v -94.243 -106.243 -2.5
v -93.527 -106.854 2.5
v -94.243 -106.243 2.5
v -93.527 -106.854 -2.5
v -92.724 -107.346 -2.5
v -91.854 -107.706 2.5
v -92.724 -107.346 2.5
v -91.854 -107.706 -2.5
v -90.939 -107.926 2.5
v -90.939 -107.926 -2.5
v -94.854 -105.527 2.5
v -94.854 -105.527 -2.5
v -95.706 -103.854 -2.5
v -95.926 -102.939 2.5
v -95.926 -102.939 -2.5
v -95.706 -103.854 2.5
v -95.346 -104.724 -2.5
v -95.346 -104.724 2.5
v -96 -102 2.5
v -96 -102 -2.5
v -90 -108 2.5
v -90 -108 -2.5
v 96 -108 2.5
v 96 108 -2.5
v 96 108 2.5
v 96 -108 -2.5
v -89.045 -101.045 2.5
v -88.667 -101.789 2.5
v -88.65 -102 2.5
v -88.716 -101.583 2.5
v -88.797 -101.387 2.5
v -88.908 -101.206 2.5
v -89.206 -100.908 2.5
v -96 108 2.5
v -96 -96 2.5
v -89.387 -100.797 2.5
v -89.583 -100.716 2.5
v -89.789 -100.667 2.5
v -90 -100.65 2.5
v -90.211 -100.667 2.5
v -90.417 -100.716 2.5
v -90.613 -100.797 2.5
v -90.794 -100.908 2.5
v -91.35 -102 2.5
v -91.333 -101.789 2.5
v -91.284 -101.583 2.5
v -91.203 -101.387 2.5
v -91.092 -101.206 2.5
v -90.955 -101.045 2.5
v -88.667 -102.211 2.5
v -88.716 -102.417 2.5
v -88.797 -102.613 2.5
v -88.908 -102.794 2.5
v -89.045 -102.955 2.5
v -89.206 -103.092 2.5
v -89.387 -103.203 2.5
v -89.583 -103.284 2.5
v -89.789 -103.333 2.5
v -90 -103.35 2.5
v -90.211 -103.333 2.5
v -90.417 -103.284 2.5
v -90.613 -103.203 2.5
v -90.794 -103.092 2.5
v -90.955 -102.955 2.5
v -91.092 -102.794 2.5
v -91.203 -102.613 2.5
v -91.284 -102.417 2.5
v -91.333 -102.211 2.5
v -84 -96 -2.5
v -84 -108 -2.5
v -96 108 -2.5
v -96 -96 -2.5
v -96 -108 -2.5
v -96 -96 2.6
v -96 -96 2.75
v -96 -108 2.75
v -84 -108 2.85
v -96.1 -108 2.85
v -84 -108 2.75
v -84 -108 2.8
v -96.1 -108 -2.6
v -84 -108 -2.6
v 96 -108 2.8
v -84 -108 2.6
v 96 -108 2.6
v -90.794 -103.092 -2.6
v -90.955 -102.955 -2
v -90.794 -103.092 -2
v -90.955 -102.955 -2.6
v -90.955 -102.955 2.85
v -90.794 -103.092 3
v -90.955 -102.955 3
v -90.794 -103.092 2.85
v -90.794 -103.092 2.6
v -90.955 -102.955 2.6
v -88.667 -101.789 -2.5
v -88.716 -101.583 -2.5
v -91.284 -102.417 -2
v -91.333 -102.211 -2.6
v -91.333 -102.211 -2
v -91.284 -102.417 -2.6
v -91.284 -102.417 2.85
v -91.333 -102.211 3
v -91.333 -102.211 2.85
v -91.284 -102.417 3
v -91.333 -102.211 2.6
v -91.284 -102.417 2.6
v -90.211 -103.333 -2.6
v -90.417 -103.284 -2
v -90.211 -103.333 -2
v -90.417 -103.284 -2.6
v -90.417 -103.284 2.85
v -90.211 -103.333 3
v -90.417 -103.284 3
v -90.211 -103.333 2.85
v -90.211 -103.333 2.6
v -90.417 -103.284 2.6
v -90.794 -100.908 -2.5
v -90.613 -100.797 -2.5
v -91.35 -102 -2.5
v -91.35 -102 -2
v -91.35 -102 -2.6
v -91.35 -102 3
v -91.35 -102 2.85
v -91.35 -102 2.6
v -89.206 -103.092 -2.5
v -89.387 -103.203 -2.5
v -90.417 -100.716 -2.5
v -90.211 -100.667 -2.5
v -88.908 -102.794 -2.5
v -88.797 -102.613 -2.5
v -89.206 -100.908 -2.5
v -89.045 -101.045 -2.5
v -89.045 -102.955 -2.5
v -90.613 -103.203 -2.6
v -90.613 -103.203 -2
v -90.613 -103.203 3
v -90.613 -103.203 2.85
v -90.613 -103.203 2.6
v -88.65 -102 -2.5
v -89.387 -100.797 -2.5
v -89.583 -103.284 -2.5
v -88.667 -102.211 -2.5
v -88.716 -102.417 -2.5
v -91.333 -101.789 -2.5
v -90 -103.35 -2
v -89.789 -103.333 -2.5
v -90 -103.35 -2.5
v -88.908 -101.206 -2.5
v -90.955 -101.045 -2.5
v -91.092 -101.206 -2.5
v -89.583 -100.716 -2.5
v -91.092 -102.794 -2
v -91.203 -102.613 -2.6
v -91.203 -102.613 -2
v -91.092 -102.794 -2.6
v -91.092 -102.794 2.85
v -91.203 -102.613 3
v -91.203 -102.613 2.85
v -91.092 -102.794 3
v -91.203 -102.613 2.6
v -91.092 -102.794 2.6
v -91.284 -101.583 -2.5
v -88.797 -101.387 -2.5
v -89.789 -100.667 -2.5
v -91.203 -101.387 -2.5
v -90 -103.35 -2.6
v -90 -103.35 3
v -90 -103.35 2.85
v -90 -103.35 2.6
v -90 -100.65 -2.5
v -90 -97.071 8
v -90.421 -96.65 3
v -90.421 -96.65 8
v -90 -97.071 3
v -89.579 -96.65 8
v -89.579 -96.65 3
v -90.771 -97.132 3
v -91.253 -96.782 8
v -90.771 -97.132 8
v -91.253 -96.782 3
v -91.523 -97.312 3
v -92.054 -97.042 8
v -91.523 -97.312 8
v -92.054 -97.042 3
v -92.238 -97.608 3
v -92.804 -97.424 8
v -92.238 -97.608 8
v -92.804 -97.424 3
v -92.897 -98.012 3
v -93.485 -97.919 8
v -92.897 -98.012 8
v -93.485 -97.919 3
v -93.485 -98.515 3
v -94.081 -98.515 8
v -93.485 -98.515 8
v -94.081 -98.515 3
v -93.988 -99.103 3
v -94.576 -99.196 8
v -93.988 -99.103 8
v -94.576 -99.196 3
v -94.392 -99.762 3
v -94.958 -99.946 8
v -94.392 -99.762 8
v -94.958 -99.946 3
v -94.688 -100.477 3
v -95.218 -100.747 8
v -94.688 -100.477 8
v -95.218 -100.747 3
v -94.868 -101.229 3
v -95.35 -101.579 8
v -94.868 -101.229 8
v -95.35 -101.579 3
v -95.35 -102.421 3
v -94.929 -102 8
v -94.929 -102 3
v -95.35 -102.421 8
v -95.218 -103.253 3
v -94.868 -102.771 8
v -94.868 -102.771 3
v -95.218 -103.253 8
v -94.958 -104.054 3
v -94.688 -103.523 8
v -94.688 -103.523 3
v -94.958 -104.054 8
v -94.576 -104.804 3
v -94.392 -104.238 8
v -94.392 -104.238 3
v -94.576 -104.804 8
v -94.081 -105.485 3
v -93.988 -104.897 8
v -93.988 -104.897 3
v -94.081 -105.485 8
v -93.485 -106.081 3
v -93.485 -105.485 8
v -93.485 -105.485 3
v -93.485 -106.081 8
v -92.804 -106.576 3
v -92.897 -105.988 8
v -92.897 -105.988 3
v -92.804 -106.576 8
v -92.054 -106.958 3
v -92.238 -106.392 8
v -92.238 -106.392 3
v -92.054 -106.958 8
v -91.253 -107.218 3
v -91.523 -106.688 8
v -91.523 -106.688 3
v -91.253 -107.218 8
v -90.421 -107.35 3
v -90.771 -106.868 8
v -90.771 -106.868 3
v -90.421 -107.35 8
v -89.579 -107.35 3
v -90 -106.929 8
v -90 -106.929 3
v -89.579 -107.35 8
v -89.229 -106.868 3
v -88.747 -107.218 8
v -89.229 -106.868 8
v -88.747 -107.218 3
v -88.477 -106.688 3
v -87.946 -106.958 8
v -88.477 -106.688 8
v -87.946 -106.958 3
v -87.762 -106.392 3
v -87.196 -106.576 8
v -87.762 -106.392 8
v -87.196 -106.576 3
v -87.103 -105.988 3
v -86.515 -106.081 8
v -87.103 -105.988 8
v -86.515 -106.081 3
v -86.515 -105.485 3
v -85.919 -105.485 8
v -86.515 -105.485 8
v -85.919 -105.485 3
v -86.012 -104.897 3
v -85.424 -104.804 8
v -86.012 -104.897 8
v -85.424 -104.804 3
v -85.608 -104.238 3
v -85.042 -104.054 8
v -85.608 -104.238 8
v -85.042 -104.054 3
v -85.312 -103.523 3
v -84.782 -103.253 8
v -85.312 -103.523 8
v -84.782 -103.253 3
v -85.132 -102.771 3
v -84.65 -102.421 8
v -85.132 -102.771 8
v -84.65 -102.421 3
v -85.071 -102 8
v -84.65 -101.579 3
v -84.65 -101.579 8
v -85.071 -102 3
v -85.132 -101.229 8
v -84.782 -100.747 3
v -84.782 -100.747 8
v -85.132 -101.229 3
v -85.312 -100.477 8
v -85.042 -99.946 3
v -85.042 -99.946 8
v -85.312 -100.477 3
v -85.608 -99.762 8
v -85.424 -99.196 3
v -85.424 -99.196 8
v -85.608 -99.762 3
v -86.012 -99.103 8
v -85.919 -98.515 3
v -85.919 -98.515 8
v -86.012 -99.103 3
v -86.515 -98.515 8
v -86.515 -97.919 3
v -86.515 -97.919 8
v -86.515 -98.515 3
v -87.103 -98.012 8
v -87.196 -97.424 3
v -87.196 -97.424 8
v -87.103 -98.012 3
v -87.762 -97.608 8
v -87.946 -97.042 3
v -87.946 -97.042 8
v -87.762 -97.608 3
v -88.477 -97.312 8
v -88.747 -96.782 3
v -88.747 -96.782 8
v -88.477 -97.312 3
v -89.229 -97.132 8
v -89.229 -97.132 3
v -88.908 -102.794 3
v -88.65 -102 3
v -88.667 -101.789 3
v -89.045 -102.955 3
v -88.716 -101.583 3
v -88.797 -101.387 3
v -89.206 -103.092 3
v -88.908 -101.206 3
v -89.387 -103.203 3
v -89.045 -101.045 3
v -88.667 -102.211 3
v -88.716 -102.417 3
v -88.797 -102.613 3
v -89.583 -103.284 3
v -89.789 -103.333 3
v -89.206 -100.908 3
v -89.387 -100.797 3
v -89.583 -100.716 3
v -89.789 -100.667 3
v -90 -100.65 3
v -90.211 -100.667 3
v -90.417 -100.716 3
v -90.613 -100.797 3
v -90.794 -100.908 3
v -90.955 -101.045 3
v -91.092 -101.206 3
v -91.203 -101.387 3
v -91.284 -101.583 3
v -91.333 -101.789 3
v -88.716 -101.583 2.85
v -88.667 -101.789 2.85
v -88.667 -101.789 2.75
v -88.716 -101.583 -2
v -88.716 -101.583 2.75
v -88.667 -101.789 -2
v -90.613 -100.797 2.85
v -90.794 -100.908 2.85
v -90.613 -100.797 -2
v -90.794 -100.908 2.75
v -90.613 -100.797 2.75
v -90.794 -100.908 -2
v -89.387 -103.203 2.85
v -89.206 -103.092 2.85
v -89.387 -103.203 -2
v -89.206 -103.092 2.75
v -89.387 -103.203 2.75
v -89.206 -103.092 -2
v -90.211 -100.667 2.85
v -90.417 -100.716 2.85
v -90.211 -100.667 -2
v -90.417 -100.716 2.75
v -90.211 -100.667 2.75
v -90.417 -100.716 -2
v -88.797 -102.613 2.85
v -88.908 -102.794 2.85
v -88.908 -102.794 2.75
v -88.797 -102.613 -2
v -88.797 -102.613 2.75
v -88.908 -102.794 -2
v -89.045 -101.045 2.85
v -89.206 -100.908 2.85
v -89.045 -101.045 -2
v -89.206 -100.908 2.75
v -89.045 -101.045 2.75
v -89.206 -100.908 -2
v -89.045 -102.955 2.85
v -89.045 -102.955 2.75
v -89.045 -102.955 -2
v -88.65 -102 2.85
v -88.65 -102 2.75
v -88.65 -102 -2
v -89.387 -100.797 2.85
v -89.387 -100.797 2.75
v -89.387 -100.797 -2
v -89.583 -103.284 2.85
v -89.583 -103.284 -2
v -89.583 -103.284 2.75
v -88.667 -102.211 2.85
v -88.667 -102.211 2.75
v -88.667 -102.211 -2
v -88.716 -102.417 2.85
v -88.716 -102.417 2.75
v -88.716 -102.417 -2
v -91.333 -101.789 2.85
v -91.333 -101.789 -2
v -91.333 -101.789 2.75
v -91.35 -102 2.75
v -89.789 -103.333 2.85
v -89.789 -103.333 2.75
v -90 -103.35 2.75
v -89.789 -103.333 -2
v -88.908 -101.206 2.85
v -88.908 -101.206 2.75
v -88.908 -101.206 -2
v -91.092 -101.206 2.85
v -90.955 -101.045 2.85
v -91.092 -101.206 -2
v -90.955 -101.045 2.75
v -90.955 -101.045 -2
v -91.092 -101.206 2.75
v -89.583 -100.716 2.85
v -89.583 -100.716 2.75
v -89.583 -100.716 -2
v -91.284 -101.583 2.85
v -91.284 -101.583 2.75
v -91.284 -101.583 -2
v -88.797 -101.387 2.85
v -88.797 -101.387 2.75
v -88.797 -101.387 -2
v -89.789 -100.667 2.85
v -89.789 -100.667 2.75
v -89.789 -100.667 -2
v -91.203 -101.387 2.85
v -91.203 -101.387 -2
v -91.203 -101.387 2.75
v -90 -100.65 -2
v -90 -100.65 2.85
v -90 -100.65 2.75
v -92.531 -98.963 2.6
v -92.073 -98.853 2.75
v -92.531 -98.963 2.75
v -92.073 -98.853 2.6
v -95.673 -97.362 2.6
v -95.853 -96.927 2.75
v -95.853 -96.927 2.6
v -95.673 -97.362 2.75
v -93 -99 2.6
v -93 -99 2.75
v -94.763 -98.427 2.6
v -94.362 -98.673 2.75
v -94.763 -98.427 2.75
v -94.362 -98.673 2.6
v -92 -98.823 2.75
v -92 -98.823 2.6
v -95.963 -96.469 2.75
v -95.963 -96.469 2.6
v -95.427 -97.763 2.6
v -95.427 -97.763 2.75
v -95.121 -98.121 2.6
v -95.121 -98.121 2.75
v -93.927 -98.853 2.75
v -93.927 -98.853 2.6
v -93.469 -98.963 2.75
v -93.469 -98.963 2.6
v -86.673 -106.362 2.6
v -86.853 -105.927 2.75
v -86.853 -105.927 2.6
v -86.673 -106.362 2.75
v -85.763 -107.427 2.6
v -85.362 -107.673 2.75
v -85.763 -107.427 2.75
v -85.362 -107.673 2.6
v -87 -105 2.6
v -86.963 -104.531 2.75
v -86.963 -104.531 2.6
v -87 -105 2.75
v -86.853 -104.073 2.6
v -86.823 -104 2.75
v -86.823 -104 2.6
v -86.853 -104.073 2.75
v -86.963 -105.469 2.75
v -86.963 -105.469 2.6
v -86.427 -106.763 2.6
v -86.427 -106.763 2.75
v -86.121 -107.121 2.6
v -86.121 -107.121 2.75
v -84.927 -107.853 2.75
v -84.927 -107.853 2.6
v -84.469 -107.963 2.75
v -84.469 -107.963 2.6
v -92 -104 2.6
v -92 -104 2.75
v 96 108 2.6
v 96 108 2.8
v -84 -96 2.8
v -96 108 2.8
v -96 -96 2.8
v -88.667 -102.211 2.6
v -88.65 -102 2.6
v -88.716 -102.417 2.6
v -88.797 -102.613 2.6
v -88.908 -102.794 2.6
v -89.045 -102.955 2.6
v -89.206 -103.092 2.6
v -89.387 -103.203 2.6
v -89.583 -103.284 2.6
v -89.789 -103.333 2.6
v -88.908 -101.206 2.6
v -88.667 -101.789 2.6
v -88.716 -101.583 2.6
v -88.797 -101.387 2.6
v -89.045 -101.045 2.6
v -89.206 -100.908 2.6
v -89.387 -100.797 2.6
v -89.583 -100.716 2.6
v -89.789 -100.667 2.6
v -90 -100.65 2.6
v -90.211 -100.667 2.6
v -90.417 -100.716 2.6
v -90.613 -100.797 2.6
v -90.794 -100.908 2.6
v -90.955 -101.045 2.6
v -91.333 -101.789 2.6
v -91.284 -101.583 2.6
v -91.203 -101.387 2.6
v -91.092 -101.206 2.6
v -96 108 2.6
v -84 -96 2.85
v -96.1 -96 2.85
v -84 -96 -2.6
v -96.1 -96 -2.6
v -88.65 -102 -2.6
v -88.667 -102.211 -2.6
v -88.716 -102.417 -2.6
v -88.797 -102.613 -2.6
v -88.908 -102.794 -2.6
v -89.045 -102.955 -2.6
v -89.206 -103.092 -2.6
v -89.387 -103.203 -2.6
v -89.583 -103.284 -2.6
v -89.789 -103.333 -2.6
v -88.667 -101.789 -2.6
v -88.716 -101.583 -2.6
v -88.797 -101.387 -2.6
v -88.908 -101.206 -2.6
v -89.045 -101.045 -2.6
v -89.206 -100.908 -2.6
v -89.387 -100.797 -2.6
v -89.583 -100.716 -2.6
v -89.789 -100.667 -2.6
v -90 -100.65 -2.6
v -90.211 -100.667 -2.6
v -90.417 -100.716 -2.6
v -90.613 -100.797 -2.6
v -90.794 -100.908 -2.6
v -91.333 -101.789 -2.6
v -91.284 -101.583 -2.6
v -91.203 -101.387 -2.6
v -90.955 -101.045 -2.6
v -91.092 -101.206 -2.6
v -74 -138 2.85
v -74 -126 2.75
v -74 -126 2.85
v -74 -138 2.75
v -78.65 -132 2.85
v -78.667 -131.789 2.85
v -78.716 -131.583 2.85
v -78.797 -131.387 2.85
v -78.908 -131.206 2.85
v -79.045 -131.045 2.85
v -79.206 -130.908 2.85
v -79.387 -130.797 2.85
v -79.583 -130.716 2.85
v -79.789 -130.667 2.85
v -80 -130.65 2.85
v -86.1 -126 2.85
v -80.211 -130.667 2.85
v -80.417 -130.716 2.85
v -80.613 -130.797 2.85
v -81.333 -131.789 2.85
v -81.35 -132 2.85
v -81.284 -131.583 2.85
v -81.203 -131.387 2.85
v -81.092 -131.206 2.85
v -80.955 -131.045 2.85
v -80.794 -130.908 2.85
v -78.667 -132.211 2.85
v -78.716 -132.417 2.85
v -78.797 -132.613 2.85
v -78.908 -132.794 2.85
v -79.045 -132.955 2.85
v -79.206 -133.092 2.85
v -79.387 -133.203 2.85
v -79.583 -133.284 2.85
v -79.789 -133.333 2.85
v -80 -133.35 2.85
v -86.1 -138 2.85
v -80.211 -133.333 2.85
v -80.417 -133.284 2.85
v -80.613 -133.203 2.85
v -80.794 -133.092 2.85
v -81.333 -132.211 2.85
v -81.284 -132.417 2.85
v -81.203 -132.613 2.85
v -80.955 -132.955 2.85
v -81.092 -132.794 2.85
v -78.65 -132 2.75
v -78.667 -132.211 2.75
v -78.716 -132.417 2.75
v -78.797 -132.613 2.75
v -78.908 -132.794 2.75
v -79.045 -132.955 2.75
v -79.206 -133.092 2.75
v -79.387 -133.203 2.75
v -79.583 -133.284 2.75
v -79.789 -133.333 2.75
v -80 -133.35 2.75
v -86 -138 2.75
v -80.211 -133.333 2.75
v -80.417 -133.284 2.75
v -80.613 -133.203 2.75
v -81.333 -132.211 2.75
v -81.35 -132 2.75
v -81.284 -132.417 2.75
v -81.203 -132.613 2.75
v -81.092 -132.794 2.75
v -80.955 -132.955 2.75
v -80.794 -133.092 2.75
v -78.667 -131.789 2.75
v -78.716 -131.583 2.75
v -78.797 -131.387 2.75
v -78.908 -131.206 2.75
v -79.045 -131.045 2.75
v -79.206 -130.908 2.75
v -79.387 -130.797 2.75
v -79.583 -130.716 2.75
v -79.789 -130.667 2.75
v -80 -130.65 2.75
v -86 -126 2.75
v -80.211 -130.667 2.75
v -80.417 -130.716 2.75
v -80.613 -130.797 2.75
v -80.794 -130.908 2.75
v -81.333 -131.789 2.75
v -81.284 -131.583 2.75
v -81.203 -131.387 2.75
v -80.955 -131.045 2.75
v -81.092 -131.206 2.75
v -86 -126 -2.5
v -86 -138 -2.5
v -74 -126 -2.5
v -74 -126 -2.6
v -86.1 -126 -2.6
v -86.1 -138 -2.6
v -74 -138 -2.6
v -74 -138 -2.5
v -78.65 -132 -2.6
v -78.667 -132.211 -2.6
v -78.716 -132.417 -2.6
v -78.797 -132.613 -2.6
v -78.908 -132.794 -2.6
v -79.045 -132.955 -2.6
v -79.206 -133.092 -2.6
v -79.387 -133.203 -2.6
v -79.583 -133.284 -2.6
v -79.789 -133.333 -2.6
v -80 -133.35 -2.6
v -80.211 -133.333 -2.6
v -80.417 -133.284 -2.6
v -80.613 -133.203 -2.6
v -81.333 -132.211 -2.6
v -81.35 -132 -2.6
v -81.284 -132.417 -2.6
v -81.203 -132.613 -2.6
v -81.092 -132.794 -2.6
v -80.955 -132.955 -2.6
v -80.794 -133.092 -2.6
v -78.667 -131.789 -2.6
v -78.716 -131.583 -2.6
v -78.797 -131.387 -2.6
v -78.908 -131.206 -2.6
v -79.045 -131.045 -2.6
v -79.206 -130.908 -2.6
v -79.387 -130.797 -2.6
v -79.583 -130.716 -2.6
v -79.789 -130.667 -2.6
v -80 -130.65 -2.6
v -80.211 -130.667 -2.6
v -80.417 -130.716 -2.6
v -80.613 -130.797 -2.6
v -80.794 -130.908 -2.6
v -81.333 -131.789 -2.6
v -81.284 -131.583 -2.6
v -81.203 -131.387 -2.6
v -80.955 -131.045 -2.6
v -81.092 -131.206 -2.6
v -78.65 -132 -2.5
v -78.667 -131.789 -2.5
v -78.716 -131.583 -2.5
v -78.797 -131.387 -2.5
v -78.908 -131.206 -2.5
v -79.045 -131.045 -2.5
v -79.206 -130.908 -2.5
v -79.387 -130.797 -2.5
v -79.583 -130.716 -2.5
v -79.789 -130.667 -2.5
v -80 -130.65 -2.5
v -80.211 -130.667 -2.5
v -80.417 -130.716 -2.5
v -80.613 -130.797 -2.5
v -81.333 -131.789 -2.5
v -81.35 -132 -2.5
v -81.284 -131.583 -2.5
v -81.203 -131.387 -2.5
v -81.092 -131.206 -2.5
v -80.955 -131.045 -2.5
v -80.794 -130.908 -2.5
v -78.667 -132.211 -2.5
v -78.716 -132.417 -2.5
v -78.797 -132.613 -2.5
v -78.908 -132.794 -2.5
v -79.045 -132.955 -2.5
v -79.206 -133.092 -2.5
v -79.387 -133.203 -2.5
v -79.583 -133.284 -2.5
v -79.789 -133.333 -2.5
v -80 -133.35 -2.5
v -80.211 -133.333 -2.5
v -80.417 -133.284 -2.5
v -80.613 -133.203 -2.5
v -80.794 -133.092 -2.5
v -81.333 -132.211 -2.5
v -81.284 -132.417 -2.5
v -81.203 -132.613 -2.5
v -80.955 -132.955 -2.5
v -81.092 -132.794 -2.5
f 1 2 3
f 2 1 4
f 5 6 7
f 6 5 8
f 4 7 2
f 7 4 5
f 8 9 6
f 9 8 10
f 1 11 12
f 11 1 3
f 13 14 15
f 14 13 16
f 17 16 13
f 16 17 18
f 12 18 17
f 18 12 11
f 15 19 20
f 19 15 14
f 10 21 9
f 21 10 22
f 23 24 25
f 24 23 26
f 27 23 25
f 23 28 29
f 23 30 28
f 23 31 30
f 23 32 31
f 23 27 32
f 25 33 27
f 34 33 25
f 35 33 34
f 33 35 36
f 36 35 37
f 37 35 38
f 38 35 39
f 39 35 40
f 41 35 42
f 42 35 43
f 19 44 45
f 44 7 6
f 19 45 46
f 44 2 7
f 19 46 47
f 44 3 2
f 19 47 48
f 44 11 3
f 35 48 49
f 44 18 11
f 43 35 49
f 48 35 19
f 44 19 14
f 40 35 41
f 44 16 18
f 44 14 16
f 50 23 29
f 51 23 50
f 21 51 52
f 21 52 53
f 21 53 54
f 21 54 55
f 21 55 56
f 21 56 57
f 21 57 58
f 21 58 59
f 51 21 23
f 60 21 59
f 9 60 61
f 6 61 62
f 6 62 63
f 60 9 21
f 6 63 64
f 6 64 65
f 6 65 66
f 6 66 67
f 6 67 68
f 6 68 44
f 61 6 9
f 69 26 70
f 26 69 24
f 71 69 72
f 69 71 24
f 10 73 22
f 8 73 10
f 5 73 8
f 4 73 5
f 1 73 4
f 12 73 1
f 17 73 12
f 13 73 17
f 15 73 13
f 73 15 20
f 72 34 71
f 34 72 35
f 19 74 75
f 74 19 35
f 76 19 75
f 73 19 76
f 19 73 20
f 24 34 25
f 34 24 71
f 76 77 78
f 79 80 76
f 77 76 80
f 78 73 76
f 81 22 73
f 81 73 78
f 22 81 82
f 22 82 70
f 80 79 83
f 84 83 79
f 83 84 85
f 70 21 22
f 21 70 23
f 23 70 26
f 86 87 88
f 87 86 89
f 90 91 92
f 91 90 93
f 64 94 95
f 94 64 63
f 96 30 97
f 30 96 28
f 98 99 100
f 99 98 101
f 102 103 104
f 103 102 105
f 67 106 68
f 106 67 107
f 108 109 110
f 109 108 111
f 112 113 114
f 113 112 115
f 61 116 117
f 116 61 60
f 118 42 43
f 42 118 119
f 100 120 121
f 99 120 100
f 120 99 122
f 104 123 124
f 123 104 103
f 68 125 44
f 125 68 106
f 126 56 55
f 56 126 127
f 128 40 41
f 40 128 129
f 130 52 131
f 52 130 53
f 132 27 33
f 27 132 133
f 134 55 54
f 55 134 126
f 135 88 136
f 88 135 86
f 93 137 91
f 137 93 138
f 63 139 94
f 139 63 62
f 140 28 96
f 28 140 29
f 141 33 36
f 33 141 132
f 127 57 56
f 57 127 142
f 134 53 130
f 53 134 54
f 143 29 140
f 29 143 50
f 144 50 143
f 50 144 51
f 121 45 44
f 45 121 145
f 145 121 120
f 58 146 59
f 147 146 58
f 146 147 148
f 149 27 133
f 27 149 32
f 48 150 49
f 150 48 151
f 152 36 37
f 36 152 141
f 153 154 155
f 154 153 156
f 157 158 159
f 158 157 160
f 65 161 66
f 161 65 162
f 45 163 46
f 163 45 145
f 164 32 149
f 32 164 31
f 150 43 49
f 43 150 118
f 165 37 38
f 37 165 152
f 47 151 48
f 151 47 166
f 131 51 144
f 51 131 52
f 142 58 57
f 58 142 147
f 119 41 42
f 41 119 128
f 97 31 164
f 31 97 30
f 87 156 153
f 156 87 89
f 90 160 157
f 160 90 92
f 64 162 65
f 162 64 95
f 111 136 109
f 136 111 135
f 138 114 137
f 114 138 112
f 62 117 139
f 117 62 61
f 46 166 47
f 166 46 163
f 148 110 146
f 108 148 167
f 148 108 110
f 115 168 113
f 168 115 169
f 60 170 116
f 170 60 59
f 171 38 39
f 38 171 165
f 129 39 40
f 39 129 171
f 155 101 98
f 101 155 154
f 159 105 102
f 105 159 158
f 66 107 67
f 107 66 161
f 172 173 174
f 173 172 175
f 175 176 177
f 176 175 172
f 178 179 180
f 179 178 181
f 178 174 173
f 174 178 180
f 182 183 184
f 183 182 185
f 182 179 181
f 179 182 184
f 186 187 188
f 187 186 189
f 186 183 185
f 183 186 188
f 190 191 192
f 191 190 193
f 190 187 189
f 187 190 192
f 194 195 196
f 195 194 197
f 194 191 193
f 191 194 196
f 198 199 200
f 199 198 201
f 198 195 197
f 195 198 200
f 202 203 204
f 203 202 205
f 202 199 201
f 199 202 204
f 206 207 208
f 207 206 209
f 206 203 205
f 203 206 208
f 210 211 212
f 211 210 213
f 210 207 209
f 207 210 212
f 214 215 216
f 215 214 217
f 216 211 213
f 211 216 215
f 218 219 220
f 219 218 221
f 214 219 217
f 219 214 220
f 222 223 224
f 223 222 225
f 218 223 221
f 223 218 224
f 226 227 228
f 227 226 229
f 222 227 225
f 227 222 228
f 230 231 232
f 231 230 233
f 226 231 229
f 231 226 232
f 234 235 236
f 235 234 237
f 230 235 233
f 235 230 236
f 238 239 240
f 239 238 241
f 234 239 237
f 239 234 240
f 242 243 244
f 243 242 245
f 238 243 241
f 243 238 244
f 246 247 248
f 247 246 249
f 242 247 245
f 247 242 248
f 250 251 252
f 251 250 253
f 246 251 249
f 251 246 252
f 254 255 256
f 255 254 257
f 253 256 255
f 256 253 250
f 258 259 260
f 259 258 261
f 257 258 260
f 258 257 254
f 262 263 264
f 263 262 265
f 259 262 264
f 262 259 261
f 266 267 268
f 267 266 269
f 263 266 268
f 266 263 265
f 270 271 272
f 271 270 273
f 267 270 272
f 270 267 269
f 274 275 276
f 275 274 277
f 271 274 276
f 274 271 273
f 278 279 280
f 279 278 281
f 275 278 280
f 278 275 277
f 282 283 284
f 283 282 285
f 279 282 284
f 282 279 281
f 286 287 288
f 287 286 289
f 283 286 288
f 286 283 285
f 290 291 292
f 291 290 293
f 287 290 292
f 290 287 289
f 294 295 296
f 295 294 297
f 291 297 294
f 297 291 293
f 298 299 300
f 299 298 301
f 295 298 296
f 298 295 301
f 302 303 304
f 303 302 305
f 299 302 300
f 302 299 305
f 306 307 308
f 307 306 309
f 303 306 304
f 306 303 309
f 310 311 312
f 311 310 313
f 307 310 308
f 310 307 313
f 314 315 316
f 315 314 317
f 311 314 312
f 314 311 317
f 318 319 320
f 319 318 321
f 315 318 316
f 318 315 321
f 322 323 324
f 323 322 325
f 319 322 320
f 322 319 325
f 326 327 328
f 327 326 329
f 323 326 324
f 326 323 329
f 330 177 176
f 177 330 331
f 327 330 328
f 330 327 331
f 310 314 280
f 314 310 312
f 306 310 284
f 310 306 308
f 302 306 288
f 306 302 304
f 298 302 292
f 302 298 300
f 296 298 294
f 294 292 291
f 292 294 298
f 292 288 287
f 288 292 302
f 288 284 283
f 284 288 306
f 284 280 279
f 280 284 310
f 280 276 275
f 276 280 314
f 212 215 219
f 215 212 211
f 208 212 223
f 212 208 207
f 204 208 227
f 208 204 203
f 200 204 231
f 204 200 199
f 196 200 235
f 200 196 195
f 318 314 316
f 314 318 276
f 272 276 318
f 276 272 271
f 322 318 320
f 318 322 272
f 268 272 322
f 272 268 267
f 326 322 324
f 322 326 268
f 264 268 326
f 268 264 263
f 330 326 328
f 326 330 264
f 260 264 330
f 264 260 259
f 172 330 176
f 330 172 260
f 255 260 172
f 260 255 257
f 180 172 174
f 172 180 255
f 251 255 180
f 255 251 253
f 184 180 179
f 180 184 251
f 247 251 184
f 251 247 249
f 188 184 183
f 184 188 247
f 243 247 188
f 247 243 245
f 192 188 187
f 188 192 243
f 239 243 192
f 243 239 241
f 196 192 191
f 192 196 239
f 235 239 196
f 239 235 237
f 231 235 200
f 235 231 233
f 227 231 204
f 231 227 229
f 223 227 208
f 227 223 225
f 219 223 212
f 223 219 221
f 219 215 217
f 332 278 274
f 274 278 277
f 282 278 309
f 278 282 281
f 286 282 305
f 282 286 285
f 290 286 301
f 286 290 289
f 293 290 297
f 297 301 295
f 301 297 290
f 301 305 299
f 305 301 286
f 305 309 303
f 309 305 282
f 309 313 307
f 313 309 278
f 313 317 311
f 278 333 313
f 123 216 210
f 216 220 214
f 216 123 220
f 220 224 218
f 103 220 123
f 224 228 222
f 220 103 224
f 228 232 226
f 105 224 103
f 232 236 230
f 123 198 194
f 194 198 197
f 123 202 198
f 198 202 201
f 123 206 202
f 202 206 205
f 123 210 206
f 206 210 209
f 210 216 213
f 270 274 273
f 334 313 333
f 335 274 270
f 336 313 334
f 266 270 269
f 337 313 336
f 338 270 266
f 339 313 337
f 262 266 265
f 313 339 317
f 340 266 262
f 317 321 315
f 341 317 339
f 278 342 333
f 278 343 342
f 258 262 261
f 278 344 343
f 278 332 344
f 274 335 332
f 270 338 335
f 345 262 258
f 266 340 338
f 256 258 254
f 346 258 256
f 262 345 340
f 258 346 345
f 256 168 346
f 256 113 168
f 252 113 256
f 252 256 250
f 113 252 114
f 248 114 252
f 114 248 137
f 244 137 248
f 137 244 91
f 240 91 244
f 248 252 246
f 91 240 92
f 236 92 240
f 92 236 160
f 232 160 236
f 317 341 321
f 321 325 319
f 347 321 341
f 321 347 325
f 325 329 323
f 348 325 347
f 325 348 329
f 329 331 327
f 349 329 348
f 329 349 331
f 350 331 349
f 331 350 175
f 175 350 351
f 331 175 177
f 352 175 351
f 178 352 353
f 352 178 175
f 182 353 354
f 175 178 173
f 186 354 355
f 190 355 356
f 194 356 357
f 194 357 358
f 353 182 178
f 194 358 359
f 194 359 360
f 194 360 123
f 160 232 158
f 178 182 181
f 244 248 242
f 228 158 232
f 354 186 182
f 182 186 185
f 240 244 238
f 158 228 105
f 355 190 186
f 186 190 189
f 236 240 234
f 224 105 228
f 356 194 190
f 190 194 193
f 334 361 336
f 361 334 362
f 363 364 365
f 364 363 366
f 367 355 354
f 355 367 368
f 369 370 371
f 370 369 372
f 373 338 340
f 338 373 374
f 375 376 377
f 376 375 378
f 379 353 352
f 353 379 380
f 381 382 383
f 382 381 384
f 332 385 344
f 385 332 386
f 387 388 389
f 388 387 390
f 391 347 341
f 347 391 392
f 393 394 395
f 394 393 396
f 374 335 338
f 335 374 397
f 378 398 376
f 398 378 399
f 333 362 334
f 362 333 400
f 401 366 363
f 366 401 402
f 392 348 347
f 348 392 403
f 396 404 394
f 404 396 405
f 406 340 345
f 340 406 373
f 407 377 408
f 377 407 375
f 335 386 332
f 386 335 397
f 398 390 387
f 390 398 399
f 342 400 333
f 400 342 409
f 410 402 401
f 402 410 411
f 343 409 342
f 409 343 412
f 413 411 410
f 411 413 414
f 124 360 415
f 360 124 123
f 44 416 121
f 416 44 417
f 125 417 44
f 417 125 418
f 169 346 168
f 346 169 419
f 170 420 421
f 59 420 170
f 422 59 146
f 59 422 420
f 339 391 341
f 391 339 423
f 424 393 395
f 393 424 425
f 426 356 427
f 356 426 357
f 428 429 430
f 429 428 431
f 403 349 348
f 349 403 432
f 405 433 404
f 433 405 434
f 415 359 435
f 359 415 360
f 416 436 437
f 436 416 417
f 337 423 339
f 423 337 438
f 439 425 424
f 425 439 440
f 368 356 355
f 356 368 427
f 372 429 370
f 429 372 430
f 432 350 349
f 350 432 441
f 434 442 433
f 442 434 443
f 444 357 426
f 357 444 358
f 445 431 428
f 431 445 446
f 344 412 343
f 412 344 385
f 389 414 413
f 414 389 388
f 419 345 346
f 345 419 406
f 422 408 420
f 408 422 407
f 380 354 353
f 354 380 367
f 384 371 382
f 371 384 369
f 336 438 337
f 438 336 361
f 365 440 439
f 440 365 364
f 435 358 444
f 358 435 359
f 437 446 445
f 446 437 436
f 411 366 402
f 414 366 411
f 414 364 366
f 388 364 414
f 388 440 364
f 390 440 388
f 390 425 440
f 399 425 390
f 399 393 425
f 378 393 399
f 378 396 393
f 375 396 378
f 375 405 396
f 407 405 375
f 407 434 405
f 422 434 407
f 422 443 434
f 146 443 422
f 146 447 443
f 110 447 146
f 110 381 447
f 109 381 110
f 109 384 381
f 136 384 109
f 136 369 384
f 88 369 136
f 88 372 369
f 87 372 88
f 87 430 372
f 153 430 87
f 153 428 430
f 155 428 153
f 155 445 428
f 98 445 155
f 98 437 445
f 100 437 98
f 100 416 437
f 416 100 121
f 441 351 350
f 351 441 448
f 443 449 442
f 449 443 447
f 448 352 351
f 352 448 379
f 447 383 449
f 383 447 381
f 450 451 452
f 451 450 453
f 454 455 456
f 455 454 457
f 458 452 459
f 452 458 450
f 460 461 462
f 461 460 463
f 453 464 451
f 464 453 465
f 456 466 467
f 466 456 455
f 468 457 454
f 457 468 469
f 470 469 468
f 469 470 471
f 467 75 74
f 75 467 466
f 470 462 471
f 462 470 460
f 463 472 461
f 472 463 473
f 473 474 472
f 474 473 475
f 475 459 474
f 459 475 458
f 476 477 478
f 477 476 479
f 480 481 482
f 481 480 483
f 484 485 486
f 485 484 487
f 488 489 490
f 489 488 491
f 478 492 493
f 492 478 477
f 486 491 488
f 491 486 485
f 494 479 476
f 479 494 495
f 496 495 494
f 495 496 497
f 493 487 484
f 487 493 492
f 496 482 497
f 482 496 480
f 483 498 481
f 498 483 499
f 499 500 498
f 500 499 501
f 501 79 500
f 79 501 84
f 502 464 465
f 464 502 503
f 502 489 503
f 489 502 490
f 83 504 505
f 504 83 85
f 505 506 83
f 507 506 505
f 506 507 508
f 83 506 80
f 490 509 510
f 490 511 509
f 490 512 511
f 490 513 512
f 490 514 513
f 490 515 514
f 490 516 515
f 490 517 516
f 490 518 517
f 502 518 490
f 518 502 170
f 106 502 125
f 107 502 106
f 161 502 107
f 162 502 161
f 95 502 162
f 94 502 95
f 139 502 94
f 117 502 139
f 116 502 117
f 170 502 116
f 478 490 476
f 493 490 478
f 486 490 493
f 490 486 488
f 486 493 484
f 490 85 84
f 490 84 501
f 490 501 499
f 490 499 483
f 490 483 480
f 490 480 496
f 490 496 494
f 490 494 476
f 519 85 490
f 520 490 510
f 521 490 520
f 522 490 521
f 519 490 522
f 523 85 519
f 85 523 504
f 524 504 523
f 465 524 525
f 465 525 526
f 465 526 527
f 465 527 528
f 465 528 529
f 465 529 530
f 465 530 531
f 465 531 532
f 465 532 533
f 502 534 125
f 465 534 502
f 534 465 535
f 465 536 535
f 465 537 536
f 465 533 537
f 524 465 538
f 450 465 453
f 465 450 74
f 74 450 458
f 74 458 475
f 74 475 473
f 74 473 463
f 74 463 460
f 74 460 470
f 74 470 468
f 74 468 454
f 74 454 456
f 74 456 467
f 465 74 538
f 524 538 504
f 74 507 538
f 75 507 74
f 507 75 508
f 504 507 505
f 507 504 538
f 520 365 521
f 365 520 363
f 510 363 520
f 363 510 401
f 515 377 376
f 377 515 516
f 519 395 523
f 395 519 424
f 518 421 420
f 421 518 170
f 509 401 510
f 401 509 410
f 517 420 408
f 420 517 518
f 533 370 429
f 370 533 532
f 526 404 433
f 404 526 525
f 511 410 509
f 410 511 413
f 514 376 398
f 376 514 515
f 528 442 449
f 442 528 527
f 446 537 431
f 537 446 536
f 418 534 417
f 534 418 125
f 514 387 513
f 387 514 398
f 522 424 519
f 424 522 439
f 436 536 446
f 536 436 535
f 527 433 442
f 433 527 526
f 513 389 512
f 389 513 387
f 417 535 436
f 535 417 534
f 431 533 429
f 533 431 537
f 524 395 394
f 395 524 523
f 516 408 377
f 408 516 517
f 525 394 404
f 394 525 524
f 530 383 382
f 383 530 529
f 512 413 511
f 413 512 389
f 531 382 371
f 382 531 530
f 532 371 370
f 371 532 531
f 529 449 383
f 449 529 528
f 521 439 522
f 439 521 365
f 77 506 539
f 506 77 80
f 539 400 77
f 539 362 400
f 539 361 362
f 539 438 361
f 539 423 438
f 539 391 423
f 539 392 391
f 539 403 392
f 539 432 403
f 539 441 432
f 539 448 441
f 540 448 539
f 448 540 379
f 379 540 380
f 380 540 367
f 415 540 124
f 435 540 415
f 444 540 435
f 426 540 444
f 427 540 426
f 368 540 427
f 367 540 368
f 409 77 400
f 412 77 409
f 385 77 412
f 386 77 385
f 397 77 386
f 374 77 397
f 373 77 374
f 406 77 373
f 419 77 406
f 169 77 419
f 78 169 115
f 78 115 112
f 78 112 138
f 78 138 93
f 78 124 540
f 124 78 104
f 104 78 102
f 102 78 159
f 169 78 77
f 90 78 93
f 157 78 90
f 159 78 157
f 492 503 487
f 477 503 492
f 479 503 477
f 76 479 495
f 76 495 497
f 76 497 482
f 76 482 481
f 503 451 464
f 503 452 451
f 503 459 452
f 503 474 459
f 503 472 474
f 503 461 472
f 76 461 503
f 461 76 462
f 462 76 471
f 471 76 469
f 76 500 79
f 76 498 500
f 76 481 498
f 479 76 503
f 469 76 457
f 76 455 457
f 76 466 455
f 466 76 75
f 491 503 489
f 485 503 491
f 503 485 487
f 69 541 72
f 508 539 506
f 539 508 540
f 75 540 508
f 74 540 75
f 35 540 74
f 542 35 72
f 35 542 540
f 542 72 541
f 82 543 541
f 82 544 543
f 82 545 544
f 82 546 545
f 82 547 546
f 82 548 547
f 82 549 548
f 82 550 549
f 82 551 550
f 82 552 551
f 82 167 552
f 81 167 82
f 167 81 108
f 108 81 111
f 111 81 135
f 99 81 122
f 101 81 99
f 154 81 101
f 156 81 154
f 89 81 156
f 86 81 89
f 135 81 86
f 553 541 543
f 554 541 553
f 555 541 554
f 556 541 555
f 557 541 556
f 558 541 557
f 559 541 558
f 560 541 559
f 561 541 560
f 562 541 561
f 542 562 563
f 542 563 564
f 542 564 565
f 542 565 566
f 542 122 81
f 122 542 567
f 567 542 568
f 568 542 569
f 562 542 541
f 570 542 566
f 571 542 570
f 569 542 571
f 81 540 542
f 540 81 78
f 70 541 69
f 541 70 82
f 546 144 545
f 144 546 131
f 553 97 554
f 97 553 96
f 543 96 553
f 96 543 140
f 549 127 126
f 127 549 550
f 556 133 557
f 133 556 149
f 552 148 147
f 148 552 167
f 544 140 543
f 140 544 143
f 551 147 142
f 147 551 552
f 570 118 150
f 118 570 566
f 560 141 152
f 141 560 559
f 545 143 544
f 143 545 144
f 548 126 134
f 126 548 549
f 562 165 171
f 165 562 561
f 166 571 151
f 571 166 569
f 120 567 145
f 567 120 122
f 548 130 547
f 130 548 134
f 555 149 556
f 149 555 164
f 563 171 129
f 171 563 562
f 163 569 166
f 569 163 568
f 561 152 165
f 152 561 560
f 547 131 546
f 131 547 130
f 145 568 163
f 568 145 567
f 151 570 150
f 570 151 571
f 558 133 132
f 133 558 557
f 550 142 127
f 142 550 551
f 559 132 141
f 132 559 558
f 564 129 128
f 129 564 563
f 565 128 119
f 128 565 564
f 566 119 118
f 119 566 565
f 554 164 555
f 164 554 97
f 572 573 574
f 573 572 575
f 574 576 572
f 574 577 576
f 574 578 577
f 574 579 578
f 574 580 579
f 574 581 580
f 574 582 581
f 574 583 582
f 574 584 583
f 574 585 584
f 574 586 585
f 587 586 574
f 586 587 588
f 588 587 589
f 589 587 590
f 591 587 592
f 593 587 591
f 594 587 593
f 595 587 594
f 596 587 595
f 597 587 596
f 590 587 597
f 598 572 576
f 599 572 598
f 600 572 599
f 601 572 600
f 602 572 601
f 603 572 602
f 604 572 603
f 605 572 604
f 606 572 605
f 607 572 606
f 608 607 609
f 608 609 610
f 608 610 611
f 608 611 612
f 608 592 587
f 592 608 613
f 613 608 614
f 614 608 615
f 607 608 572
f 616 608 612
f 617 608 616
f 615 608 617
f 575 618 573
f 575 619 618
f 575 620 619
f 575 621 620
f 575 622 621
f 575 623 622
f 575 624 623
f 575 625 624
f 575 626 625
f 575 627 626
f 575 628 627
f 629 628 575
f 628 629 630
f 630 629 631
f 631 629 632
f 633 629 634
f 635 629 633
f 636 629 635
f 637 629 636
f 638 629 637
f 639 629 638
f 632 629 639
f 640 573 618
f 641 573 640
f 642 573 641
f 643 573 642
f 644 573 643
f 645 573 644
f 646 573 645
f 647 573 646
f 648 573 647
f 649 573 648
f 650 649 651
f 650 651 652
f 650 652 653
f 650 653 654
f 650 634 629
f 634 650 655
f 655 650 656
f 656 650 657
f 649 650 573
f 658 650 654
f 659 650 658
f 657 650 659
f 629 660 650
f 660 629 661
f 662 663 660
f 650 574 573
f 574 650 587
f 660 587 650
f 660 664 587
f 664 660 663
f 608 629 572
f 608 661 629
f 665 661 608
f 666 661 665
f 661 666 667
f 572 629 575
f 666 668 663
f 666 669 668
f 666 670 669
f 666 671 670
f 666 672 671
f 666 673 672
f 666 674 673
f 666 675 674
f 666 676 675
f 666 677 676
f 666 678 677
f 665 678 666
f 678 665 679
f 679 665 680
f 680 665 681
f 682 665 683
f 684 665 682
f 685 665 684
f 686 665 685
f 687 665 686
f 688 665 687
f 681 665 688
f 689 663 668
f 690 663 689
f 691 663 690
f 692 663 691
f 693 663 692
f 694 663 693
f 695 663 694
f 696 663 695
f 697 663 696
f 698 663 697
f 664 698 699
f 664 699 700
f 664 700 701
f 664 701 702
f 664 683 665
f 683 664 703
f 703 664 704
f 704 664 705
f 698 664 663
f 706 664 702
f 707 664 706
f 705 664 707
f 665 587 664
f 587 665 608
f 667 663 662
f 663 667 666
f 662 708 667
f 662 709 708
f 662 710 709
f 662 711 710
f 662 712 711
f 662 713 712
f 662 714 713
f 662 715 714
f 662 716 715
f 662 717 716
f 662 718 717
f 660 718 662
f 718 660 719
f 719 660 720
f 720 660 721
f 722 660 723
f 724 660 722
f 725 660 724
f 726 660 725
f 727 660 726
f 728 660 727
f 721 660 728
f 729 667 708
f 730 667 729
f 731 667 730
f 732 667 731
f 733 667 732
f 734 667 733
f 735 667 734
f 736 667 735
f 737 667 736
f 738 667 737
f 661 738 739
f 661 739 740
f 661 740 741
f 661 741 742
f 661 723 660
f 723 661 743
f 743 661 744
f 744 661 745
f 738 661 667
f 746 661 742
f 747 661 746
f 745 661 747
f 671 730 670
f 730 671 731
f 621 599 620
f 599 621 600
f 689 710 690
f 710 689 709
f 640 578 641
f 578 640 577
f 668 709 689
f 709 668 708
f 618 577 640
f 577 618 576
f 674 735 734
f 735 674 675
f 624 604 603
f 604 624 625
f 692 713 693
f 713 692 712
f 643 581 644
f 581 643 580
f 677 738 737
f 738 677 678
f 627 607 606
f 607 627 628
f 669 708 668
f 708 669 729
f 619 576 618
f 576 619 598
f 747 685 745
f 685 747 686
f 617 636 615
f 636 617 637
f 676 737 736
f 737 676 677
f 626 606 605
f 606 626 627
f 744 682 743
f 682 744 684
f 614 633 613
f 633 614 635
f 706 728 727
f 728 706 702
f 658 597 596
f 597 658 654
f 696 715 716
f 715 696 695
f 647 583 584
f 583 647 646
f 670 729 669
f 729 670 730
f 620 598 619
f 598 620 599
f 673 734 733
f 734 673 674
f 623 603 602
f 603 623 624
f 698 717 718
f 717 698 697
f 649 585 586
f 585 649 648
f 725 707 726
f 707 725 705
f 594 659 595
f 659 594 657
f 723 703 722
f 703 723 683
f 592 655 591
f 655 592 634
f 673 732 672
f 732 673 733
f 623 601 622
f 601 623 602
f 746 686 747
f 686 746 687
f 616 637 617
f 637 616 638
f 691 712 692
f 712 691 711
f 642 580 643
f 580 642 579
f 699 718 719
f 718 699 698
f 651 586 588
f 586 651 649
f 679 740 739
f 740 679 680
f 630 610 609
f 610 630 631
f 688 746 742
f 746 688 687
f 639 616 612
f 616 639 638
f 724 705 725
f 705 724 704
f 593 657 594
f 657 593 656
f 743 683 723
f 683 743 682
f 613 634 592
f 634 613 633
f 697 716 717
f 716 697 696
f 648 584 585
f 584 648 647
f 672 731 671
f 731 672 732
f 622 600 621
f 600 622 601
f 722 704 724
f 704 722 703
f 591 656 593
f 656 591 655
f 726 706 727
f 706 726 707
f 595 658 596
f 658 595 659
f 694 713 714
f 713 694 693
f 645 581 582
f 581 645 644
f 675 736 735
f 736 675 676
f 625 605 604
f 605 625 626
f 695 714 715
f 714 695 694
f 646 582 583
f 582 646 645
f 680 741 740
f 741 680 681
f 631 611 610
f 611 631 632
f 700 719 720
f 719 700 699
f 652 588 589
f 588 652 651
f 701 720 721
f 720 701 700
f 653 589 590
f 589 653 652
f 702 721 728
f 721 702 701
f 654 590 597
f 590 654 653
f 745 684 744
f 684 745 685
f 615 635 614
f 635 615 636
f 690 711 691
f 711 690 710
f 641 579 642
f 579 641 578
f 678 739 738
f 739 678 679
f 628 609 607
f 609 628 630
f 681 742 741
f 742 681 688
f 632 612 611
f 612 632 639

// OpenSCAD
color("gray")
difference()
{
  cube([192, 216, 5], center = true);

  difference()
  {
    translate([-96, -108, 0])
    cube([12, 12, 6], center = true);

    translate([-96 + 6, -108 + 6, 0])
    cylinder(10, d = 12, $fn = 40, center = true);
  }
  
  translate([-90, -102, 0])
  cylinder(10, d = 2.7, center = true, $fn = 40);
}

color("#ddd")
translate([-90, -102, 3])
{
  difference()
  {
    cylinder(5, d = 11, $fn = 40);

    for (i = [0 : 39])
      rotate([0, 0, i * 360 / 40])
      translate([0, 12, 0])
      rotate([0, 0, 45])
      cube([10, 10, 12], center = true);
  }
  
  translate([0, 0, -5])
  cylinder(5, d = 2.7, $fn = 40);
}


color("#444")
translate([0, 0, 2.7])
difference()
{
  cube([192, 216, 0.2], center = true);

  difference()
  {
    translate([-96, -108, 0])
    cube([24, 24, 1], center = true);

    translate([-96 + 3, -108 + 12, 0])
    cylinder(2, d = 6, $fn = 40, center = true);
    translate([-96 + 12, -108 + 3, 0])
    cylinder(2, d = 6, $fn = 40, center = true);
    translate([-96 + 10, -108 + 10, 0])
    cube([12, 12, 2], center = true);
  }
  
  translate([-90, -102, 0])
  cylinder(10, d = 2.7, center = true, $fn = 40);
}

module clip()
{
  difference()
  {
    union()
    {
      translate([0, 0, 2.8])
      cube([12, 12, 0.1], center = true);
      translate([-6.05, 0, 0.125])
      cube([0.1, 12, 5.45], center = true);
      translate([0, 0, -2.55])
      cube([12, 12, 0.1], center = true);
    }

    translate([0, 0, -5])
    cylinder(10, d = 2.7, $fn = 40);
  }
}

translate([-90, -102, 0])
clip();

translate([-80, -132, 0])
clip();
